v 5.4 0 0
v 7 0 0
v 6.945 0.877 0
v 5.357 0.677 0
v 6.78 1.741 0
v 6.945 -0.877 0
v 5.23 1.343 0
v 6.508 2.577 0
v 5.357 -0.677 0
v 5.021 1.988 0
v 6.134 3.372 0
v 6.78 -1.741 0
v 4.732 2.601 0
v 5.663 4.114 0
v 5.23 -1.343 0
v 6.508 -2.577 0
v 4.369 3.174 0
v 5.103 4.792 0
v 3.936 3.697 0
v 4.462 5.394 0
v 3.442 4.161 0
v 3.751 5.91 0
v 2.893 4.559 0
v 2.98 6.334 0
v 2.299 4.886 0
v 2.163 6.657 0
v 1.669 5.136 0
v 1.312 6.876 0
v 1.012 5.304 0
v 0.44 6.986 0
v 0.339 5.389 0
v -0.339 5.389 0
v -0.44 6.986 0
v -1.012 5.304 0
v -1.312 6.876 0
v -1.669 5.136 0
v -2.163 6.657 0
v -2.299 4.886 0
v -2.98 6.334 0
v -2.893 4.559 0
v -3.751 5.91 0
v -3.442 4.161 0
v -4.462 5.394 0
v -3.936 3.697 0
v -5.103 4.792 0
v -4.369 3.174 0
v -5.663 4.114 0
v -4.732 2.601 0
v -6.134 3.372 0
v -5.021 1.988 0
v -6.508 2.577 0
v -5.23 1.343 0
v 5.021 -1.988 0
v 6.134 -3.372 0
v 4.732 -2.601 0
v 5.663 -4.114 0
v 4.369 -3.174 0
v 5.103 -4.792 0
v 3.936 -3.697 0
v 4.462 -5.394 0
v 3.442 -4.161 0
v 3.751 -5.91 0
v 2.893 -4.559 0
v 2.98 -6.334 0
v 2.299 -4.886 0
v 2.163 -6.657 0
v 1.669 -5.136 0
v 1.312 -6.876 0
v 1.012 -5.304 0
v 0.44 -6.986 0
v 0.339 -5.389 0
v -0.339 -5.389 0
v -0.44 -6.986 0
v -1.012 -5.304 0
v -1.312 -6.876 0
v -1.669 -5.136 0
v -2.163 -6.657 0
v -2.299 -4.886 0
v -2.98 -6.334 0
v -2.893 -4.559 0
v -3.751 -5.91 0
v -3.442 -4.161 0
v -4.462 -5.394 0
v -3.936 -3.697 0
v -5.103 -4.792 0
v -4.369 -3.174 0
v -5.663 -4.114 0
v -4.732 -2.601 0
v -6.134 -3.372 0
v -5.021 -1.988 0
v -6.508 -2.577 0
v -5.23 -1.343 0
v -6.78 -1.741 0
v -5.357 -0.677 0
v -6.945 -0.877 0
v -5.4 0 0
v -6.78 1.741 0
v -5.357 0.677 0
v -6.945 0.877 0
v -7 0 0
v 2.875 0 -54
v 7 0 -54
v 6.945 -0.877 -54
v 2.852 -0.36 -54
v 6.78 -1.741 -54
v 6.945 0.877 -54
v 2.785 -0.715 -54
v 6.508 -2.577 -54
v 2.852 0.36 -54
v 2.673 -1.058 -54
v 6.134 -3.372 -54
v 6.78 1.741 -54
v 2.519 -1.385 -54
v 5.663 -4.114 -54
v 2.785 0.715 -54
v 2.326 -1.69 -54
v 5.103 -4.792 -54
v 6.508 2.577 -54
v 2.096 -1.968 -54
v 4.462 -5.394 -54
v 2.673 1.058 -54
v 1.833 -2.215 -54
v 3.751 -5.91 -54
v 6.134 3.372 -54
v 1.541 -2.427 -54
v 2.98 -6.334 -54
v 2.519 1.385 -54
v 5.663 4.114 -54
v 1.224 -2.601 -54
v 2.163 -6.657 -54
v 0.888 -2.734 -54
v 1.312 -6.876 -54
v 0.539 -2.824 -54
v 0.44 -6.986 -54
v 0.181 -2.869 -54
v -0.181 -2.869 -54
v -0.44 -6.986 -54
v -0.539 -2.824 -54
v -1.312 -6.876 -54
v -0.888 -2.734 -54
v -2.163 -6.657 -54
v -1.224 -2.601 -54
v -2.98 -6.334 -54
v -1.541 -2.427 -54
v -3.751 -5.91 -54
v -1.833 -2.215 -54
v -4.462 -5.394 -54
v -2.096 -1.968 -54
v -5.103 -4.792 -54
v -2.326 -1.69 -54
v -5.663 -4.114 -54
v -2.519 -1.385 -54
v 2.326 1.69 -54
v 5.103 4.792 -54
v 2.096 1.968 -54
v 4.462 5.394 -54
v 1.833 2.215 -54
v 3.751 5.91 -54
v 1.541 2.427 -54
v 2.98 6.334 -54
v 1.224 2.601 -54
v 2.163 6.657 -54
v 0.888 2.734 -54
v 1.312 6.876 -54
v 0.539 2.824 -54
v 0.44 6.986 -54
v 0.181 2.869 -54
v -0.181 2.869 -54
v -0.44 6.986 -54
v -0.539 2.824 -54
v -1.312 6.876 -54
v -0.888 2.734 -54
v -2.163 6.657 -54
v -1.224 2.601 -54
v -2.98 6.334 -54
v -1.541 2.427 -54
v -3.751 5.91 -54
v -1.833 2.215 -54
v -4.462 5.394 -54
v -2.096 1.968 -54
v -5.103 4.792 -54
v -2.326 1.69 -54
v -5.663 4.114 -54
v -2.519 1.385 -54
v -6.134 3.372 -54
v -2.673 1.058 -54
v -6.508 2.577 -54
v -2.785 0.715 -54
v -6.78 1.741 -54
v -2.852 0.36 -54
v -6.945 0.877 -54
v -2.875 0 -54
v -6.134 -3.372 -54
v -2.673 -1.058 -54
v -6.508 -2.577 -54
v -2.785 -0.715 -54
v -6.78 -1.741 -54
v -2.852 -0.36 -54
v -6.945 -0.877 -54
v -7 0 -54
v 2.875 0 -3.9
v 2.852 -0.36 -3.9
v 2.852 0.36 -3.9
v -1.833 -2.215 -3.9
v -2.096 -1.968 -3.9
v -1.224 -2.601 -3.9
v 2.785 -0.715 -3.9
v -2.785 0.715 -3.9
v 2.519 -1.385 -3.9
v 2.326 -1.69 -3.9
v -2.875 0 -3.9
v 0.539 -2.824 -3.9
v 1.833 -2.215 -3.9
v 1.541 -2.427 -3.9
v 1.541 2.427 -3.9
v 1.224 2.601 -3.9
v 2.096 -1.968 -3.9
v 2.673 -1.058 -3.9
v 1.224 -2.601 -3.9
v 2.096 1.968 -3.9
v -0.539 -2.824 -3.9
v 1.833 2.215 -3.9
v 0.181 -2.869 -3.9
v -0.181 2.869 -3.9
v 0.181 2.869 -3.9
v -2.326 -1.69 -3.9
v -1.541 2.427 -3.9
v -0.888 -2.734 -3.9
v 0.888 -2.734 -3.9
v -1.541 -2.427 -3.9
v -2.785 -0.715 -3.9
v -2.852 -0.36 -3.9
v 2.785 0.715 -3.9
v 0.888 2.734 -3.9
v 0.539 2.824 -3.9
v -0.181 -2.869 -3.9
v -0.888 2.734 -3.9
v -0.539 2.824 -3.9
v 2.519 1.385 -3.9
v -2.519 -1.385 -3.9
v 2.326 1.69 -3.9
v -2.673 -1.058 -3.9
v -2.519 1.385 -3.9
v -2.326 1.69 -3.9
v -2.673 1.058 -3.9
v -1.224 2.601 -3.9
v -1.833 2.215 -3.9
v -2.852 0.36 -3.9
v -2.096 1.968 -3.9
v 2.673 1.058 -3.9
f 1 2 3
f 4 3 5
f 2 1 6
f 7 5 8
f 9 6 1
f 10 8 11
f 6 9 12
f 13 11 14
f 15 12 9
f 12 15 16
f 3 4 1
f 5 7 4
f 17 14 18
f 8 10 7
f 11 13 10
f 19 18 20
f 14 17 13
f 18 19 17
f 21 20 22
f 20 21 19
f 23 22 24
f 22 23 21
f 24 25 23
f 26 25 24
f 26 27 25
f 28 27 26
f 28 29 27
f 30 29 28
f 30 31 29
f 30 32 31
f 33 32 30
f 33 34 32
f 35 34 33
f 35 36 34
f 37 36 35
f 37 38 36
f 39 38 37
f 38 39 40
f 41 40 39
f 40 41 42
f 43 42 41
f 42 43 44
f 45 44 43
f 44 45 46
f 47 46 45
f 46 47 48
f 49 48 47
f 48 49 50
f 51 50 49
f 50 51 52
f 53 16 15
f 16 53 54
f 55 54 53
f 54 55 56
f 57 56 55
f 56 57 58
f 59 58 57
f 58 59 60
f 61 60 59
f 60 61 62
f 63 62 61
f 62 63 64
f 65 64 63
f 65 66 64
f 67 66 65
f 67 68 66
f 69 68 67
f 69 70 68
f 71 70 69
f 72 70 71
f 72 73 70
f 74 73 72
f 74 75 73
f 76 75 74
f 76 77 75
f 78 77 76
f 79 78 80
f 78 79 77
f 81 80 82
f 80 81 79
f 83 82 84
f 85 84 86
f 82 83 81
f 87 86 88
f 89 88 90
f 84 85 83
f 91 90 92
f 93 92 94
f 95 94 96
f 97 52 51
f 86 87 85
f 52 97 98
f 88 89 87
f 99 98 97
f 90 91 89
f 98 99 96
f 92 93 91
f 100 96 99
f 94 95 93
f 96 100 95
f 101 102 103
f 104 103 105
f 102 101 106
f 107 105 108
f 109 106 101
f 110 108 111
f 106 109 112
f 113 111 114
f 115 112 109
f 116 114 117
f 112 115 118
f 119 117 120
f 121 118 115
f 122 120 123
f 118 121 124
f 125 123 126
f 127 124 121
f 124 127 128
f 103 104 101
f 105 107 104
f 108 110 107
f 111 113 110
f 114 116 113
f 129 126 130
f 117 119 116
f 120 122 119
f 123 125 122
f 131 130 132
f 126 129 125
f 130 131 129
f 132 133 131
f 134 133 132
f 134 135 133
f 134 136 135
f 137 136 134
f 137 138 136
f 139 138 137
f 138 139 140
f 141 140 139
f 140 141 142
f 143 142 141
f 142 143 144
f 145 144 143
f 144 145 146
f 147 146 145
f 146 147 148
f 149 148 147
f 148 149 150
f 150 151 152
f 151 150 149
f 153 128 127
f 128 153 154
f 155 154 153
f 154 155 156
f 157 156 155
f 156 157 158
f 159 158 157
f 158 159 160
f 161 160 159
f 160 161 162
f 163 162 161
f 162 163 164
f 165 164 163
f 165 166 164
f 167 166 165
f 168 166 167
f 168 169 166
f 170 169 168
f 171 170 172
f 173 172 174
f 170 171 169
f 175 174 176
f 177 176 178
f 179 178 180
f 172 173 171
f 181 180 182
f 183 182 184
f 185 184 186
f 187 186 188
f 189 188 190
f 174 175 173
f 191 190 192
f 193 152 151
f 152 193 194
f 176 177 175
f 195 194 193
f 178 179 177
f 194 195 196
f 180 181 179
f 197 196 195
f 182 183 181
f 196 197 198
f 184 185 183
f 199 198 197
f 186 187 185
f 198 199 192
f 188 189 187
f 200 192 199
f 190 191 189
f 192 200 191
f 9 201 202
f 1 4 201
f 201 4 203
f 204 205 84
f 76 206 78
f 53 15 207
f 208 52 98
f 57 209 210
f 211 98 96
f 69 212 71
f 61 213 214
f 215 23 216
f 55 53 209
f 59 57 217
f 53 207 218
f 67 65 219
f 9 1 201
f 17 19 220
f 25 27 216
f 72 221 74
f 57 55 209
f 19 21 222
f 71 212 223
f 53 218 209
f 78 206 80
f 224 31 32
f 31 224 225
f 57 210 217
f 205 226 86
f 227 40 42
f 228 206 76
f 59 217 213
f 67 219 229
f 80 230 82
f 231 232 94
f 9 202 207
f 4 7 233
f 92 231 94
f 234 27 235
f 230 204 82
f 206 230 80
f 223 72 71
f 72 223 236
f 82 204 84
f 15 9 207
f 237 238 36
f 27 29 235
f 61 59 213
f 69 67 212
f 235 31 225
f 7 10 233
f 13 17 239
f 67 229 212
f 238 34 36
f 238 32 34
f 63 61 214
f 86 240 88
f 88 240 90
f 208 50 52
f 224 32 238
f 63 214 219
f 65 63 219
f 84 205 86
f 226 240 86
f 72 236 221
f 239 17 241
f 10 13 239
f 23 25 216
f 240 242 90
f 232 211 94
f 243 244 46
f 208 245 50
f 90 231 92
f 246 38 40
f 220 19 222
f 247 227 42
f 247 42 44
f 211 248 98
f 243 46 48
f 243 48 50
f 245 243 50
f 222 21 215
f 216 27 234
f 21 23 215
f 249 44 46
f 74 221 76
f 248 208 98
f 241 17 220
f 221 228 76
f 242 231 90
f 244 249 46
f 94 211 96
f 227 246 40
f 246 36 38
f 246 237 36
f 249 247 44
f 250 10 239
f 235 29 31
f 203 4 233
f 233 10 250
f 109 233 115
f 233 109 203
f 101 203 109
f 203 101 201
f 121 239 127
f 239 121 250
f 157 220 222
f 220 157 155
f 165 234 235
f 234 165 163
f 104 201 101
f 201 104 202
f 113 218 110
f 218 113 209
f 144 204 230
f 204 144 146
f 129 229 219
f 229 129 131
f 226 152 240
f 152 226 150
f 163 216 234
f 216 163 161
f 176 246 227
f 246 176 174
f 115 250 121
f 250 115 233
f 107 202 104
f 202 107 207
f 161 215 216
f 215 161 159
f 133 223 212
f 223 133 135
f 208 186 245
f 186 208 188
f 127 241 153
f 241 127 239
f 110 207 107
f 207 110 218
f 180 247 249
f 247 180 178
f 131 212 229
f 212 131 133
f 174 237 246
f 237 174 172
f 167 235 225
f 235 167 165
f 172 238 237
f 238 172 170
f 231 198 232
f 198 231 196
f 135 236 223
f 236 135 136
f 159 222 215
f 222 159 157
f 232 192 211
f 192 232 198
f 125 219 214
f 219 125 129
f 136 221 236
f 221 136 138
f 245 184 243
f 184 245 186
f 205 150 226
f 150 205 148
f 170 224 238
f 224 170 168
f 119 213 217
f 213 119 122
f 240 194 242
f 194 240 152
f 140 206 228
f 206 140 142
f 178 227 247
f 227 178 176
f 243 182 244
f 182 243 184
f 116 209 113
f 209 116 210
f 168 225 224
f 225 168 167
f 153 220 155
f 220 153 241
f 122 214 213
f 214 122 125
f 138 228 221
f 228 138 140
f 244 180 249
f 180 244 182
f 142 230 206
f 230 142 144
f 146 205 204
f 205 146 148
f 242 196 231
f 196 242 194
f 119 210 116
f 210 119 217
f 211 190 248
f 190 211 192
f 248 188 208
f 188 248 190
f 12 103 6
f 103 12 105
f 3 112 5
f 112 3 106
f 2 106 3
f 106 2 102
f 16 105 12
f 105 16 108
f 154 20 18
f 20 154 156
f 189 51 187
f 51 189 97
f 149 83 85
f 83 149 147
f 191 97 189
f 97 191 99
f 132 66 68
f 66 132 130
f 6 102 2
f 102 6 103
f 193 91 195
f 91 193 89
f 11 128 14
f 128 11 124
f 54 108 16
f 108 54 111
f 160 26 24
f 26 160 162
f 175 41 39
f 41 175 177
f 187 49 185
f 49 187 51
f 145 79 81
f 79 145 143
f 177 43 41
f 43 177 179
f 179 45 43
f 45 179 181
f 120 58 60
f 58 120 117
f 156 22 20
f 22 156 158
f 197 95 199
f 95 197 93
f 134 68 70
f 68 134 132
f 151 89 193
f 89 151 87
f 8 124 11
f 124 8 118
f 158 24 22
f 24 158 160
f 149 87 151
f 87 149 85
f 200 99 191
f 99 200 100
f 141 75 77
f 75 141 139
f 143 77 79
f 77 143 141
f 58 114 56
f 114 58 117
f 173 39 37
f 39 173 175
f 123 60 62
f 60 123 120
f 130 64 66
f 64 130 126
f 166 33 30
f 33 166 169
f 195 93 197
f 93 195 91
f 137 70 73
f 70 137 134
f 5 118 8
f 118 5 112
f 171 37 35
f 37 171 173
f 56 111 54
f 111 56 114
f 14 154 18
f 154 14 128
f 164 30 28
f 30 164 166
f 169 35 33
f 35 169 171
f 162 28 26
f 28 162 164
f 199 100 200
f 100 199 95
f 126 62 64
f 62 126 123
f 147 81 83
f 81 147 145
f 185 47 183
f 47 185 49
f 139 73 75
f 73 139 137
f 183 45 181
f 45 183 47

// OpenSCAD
$fn = 50;


difference() {
	union() {
		translate(v = [0, 0, -54.0000000000]) {
			cylinder(h = 54, r = 7.0000000000);
		}
		cylinder(h = 0, r = 13.0000000000);
	}
	union() {
		translate(v = [0, 0, 0]) {
			rotate(a = [0, 0, 0]) {
				difference() {
					union() {
						#translate(v = [0, 0, -54.0000000000]) {
							cylinder(h = 54, r = 2.6000000000);
						}
						#translate(v = [0, 0, -3.9000000000]) {
							cylinder(h = 3.9000000000, r = 7.0000000000, r1 = 2.8750000000, r2 = 5.4000000000);
						}
						#translate(v = [0, 0, -54.0000000000]) {
							cylinder(h = 54, r = 2.8750000000);
						}
						#translate(v = [0, 0, -54.0000000000]) {
							cylinder(h = 54, r = 2.6000000000);
						}
					}
					union();
				}
			}
		}
	}
}
